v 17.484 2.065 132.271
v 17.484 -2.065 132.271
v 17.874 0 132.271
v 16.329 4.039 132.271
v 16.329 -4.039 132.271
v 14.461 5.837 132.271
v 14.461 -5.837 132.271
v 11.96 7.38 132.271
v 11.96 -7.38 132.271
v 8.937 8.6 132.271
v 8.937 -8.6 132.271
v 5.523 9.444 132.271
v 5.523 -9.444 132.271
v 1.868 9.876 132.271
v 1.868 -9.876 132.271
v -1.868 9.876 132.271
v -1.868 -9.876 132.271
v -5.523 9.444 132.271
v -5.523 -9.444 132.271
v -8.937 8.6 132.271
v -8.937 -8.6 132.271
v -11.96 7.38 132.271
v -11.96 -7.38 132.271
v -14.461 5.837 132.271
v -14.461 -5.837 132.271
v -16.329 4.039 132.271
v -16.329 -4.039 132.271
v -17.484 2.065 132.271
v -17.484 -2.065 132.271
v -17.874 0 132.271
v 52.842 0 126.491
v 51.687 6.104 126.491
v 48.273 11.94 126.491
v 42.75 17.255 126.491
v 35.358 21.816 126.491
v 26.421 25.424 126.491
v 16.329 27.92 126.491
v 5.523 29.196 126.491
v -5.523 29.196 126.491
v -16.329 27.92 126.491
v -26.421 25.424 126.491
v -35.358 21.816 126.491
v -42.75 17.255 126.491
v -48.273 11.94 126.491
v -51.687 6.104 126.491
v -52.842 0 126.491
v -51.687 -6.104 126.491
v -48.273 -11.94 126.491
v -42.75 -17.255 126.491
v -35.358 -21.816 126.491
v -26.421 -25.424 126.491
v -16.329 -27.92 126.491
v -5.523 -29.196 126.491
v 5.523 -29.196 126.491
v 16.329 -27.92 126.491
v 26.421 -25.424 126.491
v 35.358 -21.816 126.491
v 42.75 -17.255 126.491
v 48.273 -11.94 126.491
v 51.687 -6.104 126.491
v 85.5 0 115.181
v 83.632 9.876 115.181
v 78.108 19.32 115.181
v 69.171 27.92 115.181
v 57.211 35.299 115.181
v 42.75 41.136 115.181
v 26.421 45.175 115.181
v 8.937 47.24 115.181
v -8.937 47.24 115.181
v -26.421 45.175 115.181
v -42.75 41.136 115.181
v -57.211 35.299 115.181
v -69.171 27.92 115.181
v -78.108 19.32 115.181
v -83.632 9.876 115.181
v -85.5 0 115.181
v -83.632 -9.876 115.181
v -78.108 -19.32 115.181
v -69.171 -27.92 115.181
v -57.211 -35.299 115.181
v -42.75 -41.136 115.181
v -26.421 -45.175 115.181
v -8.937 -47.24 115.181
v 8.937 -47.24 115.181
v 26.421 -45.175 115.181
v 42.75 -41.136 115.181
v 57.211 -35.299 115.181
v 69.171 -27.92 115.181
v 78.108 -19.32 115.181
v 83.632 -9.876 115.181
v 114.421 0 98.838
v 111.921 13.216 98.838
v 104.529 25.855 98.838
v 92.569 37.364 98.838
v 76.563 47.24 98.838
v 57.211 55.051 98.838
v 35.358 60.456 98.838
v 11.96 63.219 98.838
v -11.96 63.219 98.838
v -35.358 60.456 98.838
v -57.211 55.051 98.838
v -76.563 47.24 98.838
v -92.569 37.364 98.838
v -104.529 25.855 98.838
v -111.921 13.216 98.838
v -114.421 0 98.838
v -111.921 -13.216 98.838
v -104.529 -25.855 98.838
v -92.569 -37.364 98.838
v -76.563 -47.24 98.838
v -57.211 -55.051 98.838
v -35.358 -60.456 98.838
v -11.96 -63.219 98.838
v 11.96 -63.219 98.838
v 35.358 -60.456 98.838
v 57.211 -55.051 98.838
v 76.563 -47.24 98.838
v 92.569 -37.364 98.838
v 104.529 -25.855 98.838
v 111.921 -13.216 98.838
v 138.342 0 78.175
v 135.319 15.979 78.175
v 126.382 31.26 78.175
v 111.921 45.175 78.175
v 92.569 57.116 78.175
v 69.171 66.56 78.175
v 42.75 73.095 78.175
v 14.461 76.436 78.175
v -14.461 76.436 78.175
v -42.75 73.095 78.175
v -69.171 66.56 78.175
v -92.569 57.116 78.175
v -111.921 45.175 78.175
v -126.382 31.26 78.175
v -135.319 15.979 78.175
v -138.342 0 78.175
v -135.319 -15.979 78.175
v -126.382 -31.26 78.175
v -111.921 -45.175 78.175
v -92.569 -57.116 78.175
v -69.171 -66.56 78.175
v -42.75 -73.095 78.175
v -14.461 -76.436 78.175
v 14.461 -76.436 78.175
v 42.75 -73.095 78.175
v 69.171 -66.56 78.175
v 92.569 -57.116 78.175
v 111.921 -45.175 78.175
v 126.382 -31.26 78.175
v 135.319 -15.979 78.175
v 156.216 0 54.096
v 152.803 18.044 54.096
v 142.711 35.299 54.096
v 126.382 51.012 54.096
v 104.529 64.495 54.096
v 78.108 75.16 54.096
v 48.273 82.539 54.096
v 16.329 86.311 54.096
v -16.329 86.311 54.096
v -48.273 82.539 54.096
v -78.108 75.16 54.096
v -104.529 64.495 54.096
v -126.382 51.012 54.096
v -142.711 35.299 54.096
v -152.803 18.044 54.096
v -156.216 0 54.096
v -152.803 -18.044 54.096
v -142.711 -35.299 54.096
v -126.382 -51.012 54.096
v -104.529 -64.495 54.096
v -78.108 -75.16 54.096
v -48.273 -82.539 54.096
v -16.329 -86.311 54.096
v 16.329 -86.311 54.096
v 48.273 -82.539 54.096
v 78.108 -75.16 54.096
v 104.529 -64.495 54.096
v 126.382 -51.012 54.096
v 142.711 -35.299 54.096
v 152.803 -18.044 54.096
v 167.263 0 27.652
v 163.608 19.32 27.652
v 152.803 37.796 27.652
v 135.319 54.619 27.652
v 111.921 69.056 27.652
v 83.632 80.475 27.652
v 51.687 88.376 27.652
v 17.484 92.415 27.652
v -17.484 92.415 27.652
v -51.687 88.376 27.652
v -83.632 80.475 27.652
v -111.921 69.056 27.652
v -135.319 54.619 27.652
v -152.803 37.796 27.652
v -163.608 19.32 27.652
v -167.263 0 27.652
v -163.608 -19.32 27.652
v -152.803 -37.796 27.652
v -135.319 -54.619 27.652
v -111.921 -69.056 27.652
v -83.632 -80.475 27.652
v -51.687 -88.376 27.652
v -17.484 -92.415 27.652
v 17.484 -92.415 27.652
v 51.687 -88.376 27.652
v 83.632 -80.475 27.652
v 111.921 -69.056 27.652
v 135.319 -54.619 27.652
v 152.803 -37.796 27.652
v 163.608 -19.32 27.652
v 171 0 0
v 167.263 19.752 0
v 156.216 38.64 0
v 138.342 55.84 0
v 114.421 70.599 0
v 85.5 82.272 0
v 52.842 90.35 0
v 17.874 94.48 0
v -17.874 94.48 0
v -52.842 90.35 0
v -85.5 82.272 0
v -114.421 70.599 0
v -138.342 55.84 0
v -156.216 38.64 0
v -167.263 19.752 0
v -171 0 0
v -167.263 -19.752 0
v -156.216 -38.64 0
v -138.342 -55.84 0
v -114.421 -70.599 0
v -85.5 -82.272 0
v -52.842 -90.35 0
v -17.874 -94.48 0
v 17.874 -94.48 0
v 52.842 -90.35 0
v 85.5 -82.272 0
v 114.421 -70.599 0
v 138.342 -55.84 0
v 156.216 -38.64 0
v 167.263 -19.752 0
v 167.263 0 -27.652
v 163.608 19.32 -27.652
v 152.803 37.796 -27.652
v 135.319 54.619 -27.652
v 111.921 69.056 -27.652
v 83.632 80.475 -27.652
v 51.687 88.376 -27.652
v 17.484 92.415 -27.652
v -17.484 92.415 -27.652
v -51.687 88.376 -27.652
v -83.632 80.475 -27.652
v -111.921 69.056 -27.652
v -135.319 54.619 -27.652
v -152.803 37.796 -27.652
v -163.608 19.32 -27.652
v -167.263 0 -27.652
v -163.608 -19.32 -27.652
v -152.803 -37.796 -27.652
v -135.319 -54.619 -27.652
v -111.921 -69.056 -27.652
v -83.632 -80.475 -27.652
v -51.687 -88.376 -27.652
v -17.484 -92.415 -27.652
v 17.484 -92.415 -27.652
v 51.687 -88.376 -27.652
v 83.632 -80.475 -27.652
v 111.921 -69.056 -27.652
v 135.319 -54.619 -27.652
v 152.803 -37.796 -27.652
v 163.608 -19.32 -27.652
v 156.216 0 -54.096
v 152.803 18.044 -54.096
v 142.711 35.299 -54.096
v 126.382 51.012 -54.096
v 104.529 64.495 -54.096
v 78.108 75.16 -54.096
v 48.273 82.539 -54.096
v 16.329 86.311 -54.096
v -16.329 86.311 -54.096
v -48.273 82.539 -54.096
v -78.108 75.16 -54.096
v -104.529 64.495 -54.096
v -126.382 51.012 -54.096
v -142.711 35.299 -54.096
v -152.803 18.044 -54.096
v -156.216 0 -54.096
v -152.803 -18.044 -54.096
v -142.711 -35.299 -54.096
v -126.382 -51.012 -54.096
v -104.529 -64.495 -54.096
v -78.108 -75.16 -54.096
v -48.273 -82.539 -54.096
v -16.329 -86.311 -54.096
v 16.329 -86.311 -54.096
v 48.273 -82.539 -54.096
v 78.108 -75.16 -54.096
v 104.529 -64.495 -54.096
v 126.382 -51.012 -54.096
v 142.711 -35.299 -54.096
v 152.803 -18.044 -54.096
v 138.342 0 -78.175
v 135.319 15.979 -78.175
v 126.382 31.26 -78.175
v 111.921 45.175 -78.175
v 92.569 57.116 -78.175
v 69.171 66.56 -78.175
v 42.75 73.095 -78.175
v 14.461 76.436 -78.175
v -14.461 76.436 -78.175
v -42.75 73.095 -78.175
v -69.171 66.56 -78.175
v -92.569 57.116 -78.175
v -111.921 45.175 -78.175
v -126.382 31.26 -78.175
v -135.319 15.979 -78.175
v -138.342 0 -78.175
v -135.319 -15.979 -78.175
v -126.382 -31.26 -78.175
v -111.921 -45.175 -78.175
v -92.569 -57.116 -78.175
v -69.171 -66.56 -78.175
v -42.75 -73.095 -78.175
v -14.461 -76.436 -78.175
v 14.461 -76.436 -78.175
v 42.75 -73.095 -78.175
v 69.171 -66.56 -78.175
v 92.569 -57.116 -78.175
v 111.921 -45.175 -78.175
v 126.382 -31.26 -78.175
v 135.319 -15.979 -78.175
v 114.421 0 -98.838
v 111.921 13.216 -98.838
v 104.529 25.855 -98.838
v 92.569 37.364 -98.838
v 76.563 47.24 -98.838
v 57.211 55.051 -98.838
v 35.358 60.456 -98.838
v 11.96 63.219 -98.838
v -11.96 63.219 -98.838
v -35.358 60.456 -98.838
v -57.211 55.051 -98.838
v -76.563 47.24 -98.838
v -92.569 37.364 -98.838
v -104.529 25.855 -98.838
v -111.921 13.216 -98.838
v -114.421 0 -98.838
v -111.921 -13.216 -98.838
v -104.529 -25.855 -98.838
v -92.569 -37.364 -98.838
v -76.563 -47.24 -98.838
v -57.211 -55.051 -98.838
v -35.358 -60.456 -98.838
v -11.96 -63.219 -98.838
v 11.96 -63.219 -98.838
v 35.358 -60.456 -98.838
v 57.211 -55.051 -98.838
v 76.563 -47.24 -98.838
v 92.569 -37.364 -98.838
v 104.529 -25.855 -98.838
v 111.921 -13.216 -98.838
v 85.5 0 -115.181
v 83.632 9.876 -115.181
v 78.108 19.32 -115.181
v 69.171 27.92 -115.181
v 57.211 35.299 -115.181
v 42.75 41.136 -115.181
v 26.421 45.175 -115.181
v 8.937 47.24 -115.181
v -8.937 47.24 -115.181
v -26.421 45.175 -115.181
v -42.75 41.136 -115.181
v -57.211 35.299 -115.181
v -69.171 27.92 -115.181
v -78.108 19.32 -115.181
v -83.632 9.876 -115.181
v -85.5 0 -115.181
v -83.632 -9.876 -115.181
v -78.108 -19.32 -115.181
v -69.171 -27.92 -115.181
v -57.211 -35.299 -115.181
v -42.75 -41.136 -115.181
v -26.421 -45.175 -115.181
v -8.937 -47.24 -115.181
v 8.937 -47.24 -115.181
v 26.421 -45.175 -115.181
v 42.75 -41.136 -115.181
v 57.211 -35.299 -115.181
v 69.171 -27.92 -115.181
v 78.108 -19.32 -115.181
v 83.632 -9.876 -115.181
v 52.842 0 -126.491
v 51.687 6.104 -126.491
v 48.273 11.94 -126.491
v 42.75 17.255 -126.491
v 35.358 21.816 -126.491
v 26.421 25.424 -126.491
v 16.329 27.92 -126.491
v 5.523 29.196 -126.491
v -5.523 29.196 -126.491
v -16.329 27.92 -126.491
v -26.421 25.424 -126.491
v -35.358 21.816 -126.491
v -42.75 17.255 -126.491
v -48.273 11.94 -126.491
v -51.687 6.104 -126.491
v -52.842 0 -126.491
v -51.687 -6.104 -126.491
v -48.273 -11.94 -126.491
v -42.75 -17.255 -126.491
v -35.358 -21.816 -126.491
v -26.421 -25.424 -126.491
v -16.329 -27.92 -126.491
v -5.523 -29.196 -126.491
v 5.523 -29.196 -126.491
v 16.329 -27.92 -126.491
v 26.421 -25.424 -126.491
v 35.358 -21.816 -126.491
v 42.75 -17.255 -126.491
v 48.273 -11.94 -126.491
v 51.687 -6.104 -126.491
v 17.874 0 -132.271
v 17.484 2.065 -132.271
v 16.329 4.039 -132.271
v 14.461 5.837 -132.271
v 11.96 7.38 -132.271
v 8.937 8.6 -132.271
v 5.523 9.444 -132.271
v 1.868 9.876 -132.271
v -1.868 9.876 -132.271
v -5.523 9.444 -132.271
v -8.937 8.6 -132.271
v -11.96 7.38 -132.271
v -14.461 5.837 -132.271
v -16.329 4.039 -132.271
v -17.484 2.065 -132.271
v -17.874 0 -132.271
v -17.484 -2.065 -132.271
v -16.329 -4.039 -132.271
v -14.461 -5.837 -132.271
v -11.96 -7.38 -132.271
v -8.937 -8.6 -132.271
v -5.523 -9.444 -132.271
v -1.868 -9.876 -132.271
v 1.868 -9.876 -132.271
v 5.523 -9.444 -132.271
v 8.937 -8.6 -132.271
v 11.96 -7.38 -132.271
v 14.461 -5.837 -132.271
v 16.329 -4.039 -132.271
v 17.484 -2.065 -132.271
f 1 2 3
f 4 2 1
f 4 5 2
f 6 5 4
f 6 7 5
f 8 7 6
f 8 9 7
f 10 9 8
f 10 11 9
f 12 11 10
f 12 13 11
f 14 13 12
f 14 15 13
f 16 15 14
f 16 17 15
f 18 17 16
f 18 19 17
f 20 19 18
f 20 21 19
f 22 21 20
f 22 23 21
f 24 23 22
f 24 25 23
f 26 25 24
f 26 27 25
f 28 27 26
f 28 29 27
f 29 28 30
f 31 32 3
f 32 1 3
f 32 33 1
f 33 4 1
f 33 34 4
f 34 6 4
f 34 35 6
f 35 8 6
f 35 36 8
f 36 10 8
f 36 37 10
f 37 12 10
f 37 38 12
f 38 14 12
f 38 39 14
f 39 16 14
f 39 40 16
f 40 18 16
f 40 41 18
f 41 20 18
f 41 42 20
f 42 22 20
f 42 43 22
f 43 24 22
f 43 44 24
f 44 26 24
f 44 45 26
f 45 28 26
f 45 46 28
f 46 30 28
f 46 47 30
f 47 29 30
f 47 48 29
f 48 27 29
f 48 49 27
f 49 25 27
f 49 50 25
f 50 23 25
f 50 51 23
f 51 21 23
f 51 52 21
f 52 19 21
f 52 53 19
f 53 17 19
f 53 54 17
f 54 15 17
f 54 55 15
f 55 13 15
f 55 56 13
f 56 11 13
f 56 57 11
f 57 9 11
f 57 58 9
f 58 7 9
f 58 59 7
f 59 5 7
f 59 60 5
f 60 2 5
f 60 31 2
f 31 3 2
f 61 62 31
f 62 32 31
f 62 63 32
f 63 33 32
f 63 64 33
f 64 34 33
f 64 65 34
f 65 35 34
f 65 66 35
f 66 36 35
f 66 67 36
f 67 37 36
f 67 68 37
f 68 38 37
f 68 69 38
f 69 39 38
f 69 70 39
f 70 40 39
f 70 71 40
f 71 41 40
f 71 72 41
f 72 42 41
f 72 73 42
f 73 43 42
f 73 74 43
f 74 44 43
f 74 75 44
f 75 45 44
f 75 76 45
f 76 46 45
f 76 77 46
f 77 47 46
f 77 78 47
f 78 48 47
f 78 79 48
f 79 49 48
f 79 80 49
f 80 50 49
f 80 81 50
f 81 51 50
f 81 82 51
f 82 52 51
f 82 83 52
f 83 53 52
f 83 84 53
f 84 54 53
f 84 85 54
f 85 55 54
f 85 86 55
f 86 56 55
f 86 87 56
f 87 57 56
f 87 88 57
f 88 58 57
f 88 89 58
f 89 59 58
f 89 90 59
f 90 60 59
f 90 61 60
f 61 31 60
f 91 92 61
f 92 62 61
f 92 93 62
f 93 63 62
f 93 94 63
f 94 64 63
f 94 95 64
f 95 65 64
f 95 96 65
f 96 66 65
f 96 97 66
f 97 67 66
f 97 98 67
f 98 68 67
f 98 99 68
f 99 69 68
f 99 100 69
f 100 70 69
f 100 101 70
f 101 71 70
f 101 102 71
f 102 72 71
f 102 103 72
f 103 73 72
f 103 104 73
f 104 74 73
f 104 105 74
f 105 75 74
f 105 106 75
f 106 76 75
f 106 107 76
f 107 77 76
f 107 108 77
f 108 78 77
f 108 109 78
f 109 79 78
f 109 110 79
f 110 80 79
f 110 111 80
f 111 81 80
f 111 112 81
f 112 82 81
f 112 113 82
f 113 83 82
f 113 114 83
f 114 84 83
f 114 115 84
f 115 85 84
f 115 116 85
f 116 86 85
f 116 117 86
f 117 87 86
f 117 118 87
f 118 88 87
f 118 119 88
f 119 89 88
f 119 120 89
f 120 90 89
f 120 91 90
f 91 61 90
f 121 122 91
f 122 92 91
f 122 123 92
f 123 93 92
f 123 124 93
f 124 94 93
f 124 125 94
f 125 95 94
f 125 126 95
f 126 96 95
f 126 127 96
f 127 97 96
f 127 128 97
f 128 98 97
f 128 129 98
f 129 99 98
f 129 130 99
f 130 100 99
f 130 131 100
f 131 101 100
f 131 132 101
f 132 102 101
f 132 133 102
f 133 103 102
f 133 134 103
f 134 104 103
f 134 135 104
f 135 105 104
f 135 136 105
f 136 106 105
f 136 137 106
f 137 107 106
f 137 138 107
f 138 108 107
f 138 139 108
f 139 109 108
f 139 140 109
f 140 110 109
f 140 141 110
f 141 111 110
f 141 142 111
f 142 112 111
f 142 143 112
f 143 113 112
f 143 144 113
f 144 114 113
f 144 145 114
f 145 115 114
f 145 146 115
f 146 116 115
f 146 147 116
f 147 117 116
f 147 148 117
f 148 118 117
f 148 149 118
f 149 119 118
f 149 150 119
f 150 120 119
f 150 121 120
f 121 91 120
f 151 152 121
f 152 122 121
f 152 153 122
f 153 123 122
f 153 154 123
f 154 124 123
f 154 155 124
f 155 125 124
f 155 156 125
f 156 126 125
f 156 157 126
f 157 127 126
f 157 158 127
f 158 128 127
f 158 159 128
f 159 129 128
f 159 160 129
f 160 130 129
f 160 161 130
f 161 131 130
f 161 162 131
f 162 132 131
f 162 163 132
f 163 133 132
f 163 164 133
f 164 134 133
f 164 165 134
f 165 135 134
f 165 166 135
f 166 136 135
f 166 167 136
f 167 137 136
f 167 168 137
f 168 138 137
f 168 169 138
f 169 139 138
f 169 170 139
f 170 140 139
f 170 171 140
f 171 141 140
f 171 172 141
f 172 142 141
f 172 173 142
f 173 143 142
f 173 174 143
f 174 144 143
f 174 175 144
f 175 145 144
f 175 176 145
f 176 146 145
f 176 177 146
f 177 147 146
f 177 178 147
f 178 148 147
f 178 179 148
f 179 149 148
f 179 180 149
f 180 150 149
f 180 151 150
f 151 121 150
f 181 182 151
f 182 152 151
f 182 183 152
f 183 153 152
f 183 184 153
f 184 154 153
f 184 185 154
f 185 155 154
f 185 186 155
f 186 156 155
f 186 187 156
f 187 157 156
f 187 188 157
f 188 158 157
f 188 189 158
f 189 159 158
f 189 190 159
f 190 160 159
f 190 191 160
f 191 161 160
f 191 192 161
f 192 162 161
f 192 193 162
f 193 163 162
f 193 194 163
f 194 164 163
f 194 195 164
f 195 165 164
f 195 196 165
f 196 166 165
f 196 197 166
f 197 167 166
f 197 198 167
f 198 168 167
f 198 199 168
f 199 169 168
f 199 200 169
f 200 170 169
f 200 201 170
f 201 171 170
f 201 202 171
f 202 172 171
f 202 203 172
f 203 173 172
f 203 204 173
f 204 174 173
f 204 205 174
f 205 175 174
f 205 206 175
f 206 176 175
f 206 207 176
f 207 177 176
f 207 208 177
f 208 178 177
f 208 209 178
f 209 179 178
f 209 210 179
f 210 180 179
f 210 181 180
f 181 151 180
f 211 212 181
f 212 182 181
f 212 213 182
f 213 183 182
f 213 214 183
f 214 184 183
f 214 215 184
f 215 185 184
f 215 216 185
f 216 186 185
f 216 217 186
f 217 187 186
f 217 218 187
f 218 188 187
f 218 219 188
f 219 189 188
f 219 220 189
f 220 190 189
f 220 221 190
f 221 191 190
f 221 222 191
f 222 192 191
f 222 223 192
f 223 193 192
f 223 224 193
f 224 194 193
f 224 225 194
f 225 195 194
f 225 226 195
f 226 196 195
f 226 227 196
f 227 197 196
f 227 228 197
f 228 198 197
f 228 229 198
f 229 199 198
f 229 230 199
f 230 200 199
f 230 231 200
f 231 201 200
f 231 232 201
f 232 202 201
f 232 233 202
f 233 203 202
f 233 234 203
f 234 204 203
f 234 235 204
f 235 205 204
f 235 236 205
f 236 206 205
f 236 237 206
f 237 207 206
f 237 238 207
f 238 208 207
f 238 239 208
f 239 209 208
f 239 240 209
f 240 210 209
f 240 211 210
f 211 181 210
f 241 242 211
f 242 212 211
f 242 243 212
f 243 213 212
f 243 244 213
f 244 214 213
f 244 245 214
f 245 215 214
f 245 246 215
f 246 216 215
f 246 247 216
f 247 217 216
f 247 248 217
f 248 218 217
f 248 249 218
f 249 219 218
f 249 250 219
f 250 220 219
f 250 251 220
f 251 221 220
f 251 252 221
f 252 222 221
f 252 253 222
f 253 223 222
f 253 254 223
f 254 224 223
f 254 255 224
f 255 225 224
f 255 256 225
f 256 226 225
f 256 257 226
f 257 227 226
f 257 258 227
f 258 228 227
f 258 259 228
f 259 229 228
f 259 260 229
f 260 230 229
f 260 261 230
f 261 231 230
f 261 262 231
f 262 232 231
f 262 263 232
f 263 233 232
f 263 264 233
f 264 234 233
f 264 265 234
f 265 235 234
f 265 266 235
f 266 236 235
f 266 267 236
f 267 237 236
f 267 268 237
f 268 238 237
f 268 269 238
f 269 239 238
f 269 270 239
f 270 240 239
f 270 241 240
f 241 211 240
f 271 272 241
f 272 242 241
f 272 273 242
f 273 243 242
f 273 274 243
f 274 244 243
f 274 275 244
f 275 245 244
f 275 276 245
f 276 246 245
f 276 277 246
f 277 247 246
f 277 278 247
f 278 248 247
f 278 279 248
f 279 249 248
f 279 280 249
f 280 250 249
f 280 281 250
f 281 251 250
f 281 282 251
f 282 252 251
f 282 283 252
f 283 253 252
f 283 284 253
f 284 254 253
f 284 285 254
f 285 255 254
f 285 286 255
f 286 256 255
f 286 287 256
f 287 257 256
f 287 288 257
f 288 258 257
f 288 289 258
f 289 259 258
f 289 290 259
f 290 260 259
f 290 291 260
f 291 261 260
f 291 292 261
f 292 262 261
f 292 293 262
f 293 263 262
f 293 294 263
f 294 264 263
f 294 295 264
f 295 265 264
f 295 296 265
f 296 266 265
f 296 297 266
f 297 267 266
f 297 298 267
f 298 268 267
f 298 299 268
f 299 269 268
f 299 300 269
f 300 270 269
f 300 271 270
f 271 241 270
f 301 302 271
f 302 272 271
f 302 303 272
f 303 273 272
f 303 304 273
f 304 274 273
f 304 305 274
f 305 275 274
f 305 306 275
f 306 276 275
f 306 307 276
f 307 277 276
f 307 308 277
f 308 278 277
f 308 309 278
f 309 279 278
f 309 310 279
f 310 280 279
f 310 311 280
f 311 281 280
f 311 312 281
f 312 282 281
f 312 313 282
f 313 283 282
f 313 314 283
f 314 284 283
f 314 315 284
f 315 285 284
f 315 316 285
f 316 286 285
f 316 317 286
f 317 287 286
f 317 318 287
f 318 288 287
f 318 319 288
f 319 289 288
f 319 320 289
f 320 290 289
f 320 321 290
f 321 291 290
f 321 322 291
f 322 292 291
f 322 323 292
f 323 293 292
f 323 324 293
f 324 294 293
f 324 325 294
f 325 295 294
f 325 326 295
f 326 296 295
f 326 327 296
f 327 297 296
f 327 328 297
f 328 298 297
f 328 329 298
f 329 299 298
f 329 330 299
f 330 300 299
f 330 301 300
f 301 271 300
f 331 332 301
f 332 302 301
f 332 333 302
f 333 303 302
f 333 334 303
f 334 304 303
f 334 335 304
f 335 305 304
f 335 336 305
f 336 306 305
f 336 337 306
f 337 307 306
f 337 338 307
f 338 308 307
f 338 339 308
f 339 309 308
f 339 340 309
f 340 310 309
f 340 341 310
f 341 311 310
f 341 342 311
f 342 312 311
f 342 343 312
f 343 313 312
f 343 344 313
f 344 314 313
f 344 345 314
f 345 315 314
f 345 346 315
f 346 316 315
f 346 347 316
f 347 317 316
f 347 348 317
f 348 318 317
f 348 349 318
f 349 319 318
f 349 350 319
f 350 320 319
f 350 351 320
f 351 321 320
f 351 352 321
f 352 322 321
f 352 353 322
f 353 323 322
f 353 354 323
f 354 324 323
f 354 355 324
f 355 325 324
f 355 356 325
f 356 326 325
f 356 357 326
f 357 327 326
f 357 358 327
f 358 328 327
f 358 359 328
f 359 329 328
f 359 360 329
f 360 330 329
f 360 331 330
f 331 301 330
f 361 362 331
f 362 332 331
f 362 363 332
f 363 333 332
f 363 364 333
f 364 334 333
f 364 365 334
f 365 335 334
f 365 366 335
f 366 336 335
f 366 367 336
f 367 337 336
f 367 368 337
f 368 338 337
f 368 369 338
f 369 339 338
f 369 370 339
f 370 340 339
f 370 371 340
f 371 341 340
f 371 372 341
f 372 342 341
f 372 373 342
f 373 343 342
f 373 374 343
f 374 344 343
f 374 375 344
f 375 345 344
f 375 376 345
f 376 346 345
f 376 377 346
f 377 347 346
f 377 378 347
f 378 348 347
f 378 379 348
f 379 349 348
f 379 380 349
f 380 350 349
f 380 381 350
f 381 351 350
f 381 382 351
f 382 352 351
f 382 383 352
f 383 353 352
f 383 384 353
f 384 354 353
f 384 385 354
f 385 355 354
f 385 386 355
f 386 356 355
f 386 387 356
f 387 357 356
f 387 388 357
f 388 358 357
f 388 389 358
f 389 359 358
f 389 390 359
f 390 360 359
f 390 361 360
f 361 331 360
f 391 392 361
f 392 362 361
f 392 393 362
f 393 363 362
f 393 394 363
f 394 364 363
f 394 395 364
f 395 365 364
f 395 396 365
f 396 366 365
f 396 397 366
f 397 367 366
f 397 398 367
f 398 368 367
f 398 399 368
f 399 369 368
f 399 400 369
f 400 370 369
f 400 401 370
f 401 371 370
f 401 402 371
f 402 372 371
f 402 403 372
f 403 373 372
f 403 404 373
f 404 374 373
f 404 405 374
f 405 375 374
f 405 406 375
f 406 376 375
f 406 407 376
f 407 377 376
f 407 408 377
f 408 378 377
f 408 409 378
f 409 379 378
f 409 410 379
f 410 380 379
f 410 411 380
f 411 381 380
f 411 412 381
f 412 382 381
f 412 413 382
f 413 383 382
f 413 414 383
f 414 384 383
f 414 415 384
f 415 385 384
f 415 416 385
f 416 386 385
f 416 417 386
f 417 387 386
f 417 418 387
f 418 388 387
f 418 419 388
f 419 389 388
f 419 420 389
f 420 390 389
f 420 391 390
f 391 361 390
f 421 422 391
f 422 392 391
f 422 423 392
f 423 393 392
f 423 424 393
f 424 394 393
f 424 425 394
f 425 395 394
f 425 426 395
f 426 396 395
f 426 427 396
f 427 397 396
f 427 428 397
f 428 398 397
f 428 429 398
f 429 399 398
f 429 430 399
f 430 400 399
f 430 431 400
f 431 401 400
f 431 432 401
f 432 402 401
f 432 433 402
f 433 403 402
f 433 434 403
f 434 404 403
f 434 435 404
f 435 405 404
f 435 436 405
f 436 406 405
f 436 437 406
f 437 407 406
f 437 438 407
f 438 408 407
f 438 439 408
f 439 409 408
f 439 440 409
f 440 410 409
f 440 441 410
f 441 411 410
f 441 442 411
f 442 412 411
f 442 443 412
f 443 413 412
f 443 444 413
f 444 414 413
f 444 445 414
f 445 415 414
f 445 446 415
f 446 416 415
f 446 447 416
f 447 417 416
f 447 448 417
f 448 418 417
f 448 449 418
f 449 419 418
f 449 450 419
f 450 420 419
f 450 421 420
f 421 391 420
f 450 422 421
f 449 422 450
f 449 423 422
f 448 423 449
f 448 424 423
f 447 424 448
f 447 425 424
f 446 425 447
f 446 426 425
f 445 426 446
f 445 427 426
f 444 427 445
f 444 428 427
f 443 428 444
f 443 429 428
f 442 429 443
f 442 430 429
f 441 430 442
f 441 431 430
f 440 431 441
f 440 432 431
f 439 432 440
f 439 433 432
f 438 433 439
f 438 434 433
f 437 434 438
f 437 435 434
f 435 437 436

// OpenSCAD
// Generated by SolidPython 1.0.1 on 2020-07-29 00:46:48


scale(v = [9, 5, 7]) {
	sphere(r = 19);
}
/***********************************************
*********      SolidPython code:      **********
************************************************
 
# import packages: SolidPython
from solid import *
from solid.utils import *
from itertools import chain, combinations, permutations


class Resize:

    def __init__(self, scad_file):
        self.scad_file = scad_file
        #self.scad_file = import_scad(scad_file)
        # cone/cylinder param:
        self.r1 = 0
        self.r2 = 0
        self.h = 0
        # rectangular prism param:
        self.w = 0
        self.l = 0
        # ellipse param:
        self.r = 0

    # import OpenScad code (file name corresponds to shape)


    # classify shape + parameters
    def assign(self, param1, param2, param3):
        if self.scad_file == 'cone.scad':
            self.r1 = param1
            self.r2 = param2
            self.h = param3
        elif self.scad_file == 'cylinder.scad':
            self.r1 = param1
            self.r2 = param2
            self.h = param3
        elif self.scad_file == 'rectangularPrism.scad':
            self.h = param1
            self.l = param2
            self.w = param3
        else:
            self.r = param1
            self.h = param2

    # resize parameters
    def iterate(self):
        x = range(3, 20, 2)
        i = 1
        if self.scad_file == 'cone.scad':
            tempList = list(permutations(x, 2))
            for temp in tempList:
                param1 = temp[0]
                param2 = temp[1]
                filepath = 'produced_scad_files/' + 'cone' + str(param1) + '_' + str(param2) + '_' + '.scad'
                scad_render_to_file(cylinder(h=param1, r1=param2, r2=0), filepath)

        elif self.scad_file == 'cylinder.scad':
            tempList = list(permutations(x, 3))
            for temp in tempList:
                param1 = temp[0]
                param2 = temp[1]
                filepath = 'produced_scad_files/' + 'cylinder' + str(param1) + '_' + str(param2) + '_' + '.scad'
                scad_render_to_file(cylinder(h=param1, r1=param2, r2=param2), filepath)

        elif self.scad_file == 'rectangularPrism.scad':
            tempList = list(permutations(x, 3))
            for temp in tempList:
                param1 = temp[0]
                param2 = temp[1]
                param3 = temp[2]
                filepath = 'produced_scad_files/' + 'rectangularPrism' + str(param1) + '_' + str(param2) + '_' + str(
                    param3) + '.scad'
                scad_render_to_file(cube(size=(param1, param2, param3)), filepath)

        elif self.scad_file == 'ellipse.scad':
            tempList = list(permutations(x, 4))
            for temp in tempList:
                param1 = temp[0]
                param2 = temp[1]
                param3 = temp[2]
                param4 = temp[3]
                filepath = 'produced_scad_files/' + 'ellipse' + str(param1) + '_' + str(param2) + '_' + str(param3) + '_' + str(param4) + '.scad'
                scad_render_to_file(scale([param1, param2, param3])(sphere(r=param4)), filepath)

    def render_to_scadfile(self):
        scad_render_to_file(scad, 'example.scad') 
 
************************************************/
